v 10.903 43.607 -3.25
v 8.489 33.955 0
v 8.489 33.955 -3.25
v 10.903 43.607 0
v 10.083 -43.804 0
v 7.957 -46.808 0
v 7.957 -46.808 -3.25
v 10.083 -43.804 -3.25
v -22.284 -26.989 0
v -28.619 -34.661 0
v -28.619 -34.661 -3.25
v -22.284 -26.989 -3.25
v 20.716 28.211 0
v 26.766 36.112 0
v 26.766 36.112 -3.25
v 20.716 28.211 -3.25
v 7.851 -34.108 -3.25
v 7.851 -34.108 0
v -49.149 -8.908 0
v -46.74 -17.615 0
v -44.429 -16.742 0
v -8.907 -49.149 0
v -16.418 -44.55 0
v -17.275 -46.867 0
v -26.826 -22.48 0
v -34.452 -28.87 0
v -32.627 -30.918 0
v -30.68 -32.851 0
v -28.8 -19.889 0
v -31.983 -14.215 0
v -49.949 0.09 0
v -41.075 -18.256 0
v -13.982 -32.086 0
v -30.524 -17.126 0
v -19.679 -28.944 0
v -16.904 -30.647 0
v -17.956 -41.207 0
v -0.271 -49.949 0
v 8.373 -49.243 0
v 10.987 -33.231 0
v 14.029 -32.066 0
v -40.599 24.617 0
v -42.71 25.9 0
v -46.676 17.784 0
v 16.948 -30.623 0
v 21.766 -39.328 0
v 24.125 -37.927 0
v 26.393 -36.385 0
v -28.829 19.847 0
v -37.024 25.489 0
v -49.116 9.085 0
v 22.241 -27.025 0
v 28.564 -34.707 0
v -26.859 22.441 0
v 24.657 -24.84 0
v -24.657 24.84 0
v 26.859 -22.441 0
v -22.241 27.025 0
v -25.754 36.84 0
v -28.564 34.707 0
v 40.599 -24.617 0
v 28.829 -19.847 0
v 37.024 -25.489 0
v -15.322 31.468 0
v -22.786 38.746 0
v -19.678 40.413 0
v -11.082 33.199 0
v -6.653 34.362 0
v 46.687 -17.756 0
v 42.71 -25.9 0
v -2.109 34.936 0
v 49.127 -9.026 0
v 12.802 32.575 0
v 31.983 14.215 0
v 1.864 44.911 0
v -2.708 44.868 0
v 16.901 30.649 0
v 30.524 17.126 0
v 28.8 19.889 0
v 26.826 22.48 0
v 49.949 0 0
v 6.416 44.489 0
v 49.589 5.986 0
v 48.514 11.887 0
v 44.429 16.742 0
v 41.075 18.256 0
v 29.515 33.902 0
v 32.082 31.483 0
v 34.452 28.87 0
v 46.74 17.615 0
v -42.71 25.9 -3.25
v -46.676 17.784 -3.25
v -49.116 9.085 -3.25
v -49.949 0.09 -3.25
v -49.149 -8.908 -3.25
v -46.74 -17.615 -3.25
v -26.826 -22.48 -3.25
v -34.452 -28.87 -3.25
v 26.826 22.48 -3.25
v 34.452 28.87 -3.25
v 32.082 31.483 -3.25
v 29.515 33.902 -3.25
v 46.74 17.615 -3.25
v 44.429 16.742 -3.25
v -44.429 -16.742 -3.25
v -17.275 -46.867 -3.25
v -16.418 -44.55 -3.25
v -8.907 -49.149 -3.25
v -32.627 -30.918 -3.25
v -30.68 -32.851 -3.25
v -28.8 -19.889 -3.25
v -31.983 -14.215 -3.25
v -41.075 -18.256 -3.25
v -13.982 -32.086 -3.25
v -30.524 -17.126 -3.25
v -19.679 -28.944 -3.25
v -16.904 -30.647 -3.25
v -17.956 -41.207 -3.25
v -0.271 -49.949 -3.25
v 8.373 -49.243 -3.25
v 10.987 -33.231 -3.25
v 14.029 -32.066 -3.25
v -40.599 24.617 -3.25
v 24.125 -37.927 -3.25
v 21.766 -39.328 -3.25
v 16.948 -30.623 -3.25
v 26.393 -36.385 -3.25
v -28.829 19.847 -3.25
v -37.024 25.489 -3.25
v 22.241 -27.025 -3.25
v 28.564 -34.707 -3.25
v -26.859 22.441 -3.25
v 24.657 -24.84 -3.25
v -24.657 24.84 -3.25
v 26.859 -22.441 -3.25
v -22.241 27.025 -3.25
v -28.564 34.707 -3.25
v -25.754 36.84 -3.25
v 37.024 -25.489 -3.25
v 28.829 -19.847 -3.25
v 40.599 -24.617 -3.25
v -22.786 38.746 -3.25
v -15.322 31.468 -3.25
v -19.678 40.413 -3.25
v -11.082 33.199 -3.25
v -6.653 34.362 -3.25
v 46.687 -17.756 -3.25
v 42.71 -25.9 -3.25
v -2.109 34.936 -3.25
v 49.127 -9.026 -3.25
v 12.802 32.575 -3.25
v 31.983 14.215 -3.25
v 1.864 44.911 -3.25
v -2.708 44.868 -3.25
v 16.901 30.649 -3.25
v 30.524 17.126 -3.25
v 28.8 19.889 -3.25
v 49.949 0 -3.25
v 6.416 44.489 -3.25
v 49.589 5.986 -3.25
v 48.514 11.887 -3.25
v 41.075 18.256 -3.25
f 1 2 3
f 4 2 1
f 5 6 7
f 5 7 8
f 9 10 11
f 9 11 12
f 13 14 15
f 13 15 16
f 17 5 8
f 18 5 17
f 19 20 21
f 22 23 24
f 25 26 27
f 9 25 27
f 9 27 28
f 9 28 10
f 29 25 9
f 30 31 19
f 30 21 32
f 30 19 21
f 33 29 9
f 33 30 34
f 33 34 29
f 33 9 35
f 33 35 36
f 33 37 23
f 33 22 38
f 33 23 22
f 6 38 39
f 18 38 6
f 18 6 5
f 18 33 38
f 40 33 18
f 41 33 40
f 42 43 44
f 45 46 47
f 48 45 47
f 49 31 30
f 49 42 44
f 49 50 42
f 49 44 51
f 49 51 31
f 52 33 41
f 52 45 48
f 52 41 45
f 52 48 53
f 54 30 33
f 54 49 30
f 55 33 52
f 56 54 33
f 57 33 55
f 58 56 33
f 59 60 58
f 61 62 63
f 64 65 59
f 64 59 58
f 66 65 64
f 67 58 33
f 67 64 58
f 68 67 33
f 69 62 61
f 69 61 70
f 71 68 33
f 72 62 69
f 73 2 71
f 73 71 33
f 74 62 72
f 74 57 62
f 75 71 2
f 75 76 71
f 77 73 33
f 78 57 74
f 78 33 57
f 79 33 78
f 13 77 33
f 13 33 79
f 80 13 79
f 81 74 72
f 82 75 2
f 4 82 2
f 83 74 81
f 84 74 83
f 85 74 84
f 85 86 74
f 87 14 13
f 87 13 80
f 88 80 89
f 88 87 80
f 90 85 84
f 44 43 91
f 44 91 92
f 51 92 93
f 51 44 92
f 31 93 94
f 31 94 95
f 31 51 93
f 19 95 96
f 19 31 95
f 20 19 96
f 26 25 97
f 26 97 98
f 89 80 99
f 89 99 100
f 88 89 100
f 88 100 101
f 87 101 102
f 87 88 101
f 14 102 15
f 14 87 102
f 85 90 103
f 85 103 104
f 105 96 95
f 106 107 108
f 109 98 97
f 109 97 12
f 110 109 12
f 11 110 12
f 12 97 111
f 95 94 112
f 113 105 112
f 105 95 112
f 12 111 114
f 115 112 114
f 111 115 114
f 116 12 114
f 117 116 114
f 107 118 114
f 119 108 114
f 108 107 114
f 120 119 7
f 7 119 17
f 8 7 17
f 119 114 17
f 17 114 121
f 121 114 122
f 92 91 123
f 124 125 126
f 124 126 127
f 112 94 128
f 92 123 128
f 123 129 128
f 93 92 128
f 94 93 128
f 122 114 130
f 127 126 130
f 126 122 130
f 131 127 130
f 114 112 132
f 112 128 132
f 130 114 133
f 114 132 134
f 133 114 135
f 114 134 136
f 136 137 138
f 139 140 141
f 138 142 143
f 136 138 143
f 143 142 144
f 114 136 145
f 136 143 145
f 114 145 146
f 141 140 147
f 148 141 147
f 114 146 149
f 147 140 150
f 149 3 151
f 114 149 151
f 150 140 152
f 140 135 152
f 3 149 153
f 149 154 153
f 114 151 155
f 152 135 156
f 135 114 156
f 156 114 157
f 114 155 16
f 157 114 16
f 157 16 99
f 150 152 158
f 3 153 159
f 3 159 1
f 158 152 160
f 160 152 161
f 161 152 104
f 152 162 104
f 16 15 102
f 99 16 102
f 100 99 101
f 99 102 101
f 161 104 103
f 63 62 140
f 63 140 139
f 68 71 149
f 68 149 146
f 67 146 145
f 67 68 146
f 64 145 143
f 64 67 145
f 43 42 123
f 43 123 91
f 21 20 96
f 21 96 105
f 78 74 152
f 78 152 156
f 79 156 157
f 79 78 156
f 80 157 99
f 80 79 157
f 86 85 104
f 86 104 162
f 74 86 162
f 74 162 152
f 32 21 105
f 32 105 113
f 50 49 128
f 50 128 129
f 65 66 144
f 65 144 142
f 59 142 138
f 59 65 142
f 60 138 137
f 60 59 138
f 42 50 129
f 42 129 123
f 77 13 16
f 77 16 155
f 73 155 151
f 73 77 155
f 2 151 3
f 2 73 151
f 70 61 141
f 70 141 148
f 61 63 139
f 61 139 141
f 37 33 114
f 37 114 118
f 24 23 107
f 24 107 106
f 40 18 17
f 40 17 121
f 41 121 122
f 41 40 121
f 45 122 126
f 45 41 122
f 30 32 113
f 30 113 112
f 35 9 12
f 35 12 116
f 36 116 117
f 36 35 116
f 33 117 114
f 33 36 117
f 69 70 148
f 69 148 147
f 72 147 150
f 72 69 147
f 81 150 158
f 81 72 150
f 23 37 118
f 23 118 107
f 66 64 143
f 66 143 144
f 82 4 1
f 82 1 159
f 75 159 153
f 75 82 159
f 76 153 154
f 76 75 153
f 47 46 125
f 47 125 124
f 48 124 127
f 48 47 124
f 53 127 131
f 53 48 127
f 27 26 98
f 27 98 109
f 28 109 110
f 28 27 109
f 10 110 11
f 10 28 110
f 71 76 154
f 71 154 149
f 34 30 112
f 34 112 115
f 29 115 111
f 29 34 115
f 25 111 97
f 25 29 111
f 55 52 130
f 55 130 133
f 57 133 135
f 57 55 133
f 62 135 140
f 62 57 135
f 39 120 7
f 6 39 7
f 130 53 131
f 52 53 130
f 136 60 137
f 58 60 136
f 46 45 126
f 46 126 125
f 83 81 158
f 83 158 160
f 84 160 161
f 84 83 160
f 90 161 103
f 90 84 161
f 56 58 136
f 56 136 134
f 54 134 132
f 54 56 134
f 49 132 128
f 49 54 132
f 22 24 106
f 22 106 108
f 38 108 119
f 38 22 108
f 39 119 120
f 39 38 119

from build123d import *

# Parameters (mm, degrees)
BOSS_EXTRUDE1_DEPTH = 3.25


with BuildPart() as part:
    # Sketch1 → Boss-Extrude1 (new body)
    with BuildSketch(Plane.XY):
        with BuildLine():
            ThreePointArc((-17.274850221, -46.867047521), (-4.606545813, -49.736509017), (8.373275125, -49.242551286))
            Line((8.373275125, -49.242551286), (7.956694327, -46.80760748))
            Line((7.956694327, -46.80760748), (10.082748433, -43.803937887))
            Line((10.082748433, -43.803937887), (7.850969083, -34.108097051))
            ThreePointArc((7.850969083, -34.108097051), (12.521493626, -32.683515682), (16.948301539, -30.622786858))
            Line((16.948301539, -30.622786858), (21.766161472, -39.327865505))
            ThreePointArc((21.766161472, -39.327865505), (25.270761666, -37.173046623), (28.563666386, -34.70682574))
            Line((28.563666386, -34.70682574), (22.241203696, -27.02459728))
            ThreePointArc((22.241203696, -27.02459728), (25.785850836, -23.66621847), (28.828605721, -19.847203637))
            Line((28.828605721, -19.847203637), (37.023656069, -25.489128697))
            Line((37.023656069, -25.489128697), (40.598794027, -24.617047471))
            Line((40.598794027, -24.617047471), (42.709771039, -25.900116821))
            ThreePointArc((42.709771039, -25.900116821), (49.736509017, -4.606545813), (46.74013071, 17.615356218))
            Line((46.74013071, 17.615356218), (44.429411044, 16.741820001))
            Line((44.429411044, 16.741820001), (41.075257073, 18.255685327))
            Line((41.075257073, 18.255685327), (31.983399718, 14.214856401))
            ThreePointArc((31.983399718, 14.214856401), (29.693813825, 18.527747314), (26.826271623, 22.4800167))
            Line((26.826271623, 22.4800167), (34.452122443, 28.870366287))
            ThreePointArc((34.452122443, 28.870366287), (30.822303091, 32.717463571), (26.765708371, 36.111544495))
            Line((26.765708371, 36.111544495), (20.716316478, 28.210534054))
            ThreePointArc((20.716316478, 28.210534054), (14.882671096, 31.67816442), (8.489487351, 33.954802378))
            Line((8.489487351, 33.954802378), (10.902777017, 43.607066443))
            ThreePointArc((10.902777017, 43.607066443), (4.145424396, 44.757817719), (-2.708331204, 44.867713698))
            Line((-2.708331204, 44.867713698), (-2.108852035, 34.936409991))
            ThreePointArc((-2.108852035, 34.936409991), (-8.886502223, 33.853066009), (-15.322401648, 31.467824961))
            Line((-15.322401648, 31.467824961), (-19.678070256, 40.413120907))
            ThreePointArc((-19.678070256, 40.413120907), (-24.289025087, 37.82181977), (-28.563666386, 34.70682574))
            Line((-28.563666386, 34.70682574), (-22.241203696, 27.02459728))
            ThreePointArc((-22.241203696, 27.02459728), (-25.785850836, 23.66621847), (-28.828605721, 19.847203637))
            Line((-28.828605721, 19.847203637), (-37.023656069, 25.489128697))
            Line((-37.023656069, 25.489128697), (-40.598794027, 24.617047471))
            Line((-40.598794027, 24.617047471), (-42.709771039, 25.900116821))
            ThreePointArc((-42.709771039, 25.900116821), (-49.736509017, 4.606545813), (-46.74013071, -17.615356218))
            Line((-46.74013071, -17.615356218), (-44.429411044, -16.741820001))
            Line((-44.429411044, -16.741820001), (-41.075257073, -18.255685327))
            Line((-41.075257073, -18.255685327), (-31.983399718, -14.214856401))
            ThreePointArc((-31.983399718, -14.214856401), (-29.693813825, -18.527747314), (-26.826271623, -22.4800167))
            Line((-26.826271623, -22.4800167), (-34.452122443, -28.870366287))
            ThreePointArc((-34.452122443, -28.870366287), (-31.668184411, -31.899418279), (-28.61895911, -34.661245936))
            Line((-28.61895911, -34.661245936), (-22.284257579, -26.989106398))
            ThreePointArc((-22.284257579, -26.989106398), (-18.311231086, -29.8278195), (-13.981797309, -32.085968023))
            Line((-13.981797309, -32.085968023), (-17.956374991, -41.206982267))
            Line((-17.956374991, -41.206982267), (-16.418147872, -44.550033929))
            Line((-16.418147872, -44.550033929), (-17.274850221, -46.867047521))
        make_face()
    extrude(amount=-BOSS_EXTRUDE1_DEPTH)


solid = part.part
